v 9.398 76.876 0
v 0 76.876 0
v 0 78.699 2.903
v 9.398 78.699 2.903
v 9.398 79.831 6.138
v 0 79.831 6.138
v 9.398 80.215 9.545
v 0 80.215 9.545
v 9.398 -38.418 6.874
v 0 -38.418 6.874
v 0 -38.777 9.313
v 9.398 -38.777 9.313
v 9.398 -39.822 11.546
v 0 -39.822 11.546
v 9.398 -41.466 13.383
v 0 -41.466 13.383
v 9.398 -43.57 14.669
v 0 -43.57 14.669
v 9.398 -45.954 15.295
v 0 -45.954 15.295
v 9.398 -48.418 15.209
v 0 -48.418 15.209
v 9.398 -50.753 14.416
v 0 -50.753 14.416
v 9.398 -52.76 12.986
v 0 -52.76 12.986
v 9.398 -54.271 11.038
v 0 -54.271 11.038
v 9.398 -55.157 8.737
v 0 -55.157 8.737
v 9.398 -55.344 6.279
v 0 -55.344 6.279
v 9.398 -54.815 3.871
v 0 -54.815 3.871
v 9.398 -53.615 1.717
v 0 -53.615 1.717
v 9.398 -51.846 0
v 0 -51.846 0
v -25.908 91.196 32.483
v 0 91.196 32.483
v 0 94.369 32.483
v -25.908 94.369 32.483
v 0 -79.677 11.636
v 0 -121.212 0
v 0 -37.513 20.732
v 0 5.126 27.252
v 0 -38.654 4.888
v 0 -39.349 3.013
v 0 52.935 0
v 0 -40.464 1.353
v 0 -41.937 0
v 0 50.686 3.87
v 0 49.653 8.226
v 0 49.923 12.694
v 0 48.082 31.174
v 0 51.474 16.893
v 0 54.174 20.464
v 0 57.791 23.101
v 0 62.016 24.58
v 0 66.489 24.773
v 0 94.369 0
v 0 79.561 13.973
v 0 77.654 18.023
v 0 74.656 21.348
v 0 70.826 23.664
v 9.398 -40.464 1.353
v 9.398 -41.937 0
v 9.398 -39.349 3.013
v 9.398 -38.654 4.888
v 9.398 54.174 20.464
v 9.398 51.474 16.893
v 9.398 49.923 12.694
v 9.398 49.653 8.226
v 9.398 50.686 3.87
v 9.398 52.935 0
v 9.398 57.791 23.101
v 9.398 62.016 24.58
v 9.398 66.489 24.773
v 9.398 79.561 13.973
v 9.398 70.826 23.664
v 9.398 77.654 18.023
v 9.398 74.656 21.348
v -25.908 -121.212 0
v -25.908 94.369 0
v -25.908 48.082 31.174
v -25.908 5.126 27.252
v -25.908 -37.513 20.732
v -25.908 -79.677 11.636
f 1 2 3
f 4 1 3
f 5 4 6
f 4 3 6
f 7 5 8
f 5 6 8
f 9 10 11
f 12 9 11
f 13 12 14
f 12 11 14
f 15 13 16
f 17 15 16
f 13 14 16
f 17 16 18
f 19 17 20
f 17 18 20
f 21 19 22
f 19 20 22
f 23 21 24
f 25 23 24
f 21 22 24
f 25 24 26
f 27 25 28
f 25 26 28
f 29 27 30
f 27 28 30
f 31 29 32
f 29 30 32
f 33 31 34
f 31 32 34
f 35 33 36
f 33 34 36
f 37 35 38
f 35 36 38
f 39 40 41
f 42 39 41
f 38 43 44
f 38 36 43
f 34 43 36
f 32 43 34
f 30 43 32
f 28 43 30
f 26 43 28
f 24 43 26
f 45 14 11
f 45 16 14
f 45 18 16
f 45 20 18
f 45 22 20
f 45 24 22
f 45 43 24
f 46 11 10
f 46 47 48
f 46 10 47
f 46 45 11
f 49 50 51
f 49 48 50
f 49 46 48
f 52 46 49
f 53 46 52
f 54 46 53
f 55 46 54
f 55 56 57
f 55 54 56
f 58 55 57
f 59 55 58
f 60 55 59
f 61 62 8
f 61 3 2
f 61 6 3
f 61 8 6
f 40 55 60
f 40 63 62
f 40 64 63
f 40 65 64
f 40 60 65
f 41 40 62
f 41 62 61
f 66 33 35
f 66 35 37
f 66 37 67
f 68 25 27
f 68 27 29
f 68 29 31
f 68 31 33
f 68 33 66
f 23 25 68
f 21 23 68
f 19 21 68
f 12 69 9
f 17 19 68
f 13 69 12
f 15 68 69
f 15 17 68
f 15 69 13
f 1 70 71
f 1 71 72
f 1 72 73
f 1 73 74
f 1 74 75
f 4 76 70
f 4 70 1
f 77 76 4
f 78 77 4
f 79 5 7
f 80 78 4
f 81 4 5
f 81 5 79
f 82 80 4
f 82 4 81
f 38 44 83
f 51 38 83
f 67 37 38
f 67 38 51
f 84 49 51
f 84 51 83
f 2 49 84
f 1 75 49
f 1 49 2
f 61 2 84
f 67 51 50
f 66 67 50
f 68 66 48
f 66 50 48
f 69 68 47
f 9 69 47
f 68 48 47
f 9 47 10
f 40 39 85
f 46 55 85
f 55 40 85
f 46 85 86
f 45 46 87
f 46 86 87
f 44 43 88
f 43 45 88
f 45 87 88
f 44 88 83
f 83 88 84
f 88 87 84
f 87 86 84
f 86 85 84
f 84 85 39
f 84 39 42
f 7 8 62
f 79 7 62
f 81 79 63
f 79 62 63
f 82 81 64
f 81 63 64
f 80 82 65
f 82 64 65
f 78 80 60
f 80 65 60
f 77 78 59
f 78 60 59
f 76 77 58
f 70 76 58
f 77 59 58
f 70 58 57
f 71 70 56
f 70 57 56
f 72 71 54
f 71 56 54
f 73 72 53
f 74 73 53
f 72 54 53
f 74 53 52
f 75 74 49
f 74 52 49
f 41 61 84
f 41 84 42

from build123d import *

# Parameters (mm, degrees)
F0_W        = 215.5817523599
F0_H        = 32.4833281338
F1_DEPTH    = 25.908
F2_T1_DEPTH = 1087.9500123763
F4_DEPTH    = 9.398


# Not quite as in the source:
# - a fillet or chamfer that OpenCascade refuses, or shapes differently, is made with other operations: its cross-section is extruded or revolved along the edge and cut away or added


with BuildPart() as f1:
    # F0 (on Right) → F1 (new body)
    with BuildSketch(Plane.YZ):
        with Locations((-13.4214349091, 16.2416640669)):
            Rectangle(F0_W, F0_H)
    extrude(amount=-F1_DEPTH)

    # F2: fillet of radius 710.7106737728 on 1 edges, made by hand

    # F2_s2 → F2_t1 (cut)
    with BuildSketch(Plane.YZ.offset(-556.9290061881)):
        with BuildLine():
            ThreePointArc((91.1960913862, 32.4833281338), (-16.2428401618, 24.3155625185), (-121.212311089, 0))
            Line((-121.212311089, 0), (-121.212311089, 32.4833281338))
            Line((-121.212311089, 32.4833281338), (91.1960913862, 32.4833281338))
        make_face()
    extrude(amount=F2_T1_DEPTH, mode=Mode.SUBTRACT)

    # F3 (on face) → F4 (join)
    with BuildSketch(Plane.YZ):
        with BuildLine():
            ThreePointArc((-41.9370249708, 0), (-39.3490534124, 3.0127715747), (-38.4182262134, 6.873853039))
            ThreePointArc((-38.4182262134, 6.873853039), (-50.7526254785, 14.4163436408), (-51.8460630576, 0))
            Line((-51.8460630576, 0), (-41.9370249708, 0))
        make_face()
        with BuildLine():
            ThreePointArc((80.2152858595, 9.5448940992), (59.8493914636, 23.9956386528), (52.9354202211, 0))
            Line((52.9354202211, 0), (76.8756431877, 0))
            ThreePointArc((76.8756431877, 0), (79.356276258, 4.4887538584), (80.2152858595, 9.5448940992))
        make_face()
    extrude(amount=F4_DEPTH)


solid = f1.part
